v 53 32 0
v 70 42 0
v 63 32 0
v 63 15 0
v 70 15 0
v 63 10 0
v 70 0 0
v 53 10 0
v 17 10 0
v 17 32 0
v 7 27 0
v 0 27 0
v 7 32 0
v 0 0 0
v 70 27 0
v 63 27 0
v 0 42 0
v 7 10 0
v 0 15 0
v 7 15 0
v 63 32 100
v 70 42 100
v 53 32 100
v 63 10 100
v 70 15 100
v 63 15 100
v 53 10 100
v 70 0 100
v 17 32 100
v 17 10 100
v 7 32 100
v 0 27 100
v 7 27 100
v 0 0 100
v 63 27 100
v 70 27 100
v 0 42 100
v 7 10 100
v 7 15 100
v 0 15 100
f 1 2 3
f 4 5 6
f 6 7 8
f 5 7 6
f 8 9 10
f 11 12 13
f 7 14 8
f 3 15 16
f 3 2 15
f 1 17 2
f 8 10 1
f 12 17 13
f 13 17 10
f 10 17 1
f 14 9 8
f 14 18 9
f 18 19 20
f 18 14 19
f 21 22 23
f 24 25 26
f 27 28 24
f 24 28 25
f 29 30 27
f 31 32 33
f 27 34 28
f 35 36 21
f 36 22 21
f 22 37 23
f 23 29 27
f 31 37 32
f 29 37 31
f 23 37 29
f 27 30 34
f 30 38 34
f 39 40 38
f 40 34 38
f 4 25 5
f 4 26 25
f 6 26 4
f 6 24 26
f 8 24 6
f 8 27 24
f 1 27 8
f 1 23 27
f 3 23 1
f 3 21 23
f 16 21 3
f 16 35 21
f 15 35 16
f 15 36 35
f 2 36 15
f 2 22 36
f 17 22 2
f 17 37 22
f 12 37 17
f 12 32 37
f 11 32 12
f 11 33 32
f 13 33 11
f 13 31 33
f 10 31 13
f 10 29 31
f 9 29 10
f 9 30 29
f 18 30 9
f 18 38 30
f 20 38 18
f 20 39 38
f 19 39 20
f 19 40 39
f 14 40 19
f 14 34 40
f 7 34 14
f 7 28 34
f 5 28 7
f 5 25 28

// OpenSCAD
$fn = 32;

// ----------------------------------------------------------------------
// T-slot rail: 70 x 42 mm section, 100 mm long
// ----------------------------------------------------------------------

// --- parameters (mm) ---
profile_height = 100;     // extrusion height
profile_points = 20;      // points of the closed outline

profile = [[0, 0], [70, 0], [70, 15], [63, 15], [63, 10], [53, 10], [53, 32], [63, 32], [63, 27], [70, 27], [70, 42], [0, 42], [0, 27], [7, 27], [7, 32], [17, 32], [17, 10], [7, 10], [7, 15], [0, 15]];  // single closed polygon, 20 points, counter clockwise

// --- the one profile operation ---
linear_extrude(height = profile_height) polygon(points = profile);
